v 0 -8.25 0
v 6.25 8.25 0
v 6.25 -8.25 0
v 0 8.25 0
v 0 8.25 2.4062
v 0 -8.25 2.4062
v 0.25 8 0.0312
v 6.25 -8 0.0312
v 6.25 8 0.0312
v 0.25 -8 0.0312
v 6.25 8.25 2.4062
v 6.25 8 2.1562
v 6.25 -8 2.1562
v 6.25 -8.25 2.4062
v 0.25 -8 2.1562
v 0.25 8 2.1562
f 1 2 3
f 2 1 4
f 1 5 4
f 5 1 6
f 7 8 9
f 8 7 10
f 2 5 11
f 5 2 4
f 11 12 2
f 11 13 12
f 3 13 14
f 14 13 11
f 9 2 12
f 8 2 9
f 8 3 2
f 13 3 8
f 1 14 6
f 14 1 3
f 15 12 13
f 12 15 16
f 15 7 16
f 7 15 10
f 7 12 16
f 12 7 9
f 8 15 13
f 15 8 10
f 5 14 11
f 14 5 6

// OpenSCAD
res = 80;

gear_diam = 11;
gear_thick = 2;

gm_width = 16;
gm_length = 6;

shovel_thick = 0.03125;
top_thick = 0.25;
side_thick = 0.25;
ef_gear_thick = gear_thick+0.125; // Extra thickness

shovel_length = gm_length+side_thick;
shovel_width = gm_width+2*side_thick;

module shovel_2d() {
    translate([0,-shovel_width/2]) square([shovel_length, shovel_width]);
}
module shovel() {
    color([0.4,0.4,0.4]) linear_extrude(height=shovel_thick) shovel_2d();
}

module top_2d() {
    translate([0,-shovel_width/2]) square([shovel_length, shovel_width]);
}
module top() {
    color([0.75,0.65,0.56]) linear_extrude(height=top_thick) top_2d();
}

module back_2d() {
    square([ef_gear_thick, shovel_width], center=true);
}
module back() {
    color([0.75,0.65,0.56]) {
        rotate([0,-90,0]) translate([ef_gear_thick/2,0,-side_thick])
        linear_extrude(height=side_thick) back_2d();
    }
}

module side_2d() {
    square([gm_length,ef_gear_thick]);
}
module l_side() {
    color([0.75,0.65,0.56]) {
        rotate([90,0]) translate([0,0,-side_thick])
        linear_extrude(height=side_thick) side_2d();
    }
}
module r_side() {
    color([0.75,0.65,0.56]) {
        rotate([90,0])
        linear_extrude(height=side_thick) side_2d();
    }
}

module gearmech() {
    shovel();
    
    translate([side_thick,gm_width/2,shovel_thick]) l_side();
    translate([side_thick,-gm_width/2,shovel_thick]) r_side();

    translate([0,0,shovel_thick]) back();
    
    translate([0,0,shovel_thick+ef_gear_thick]) top();
}
gearmech();
